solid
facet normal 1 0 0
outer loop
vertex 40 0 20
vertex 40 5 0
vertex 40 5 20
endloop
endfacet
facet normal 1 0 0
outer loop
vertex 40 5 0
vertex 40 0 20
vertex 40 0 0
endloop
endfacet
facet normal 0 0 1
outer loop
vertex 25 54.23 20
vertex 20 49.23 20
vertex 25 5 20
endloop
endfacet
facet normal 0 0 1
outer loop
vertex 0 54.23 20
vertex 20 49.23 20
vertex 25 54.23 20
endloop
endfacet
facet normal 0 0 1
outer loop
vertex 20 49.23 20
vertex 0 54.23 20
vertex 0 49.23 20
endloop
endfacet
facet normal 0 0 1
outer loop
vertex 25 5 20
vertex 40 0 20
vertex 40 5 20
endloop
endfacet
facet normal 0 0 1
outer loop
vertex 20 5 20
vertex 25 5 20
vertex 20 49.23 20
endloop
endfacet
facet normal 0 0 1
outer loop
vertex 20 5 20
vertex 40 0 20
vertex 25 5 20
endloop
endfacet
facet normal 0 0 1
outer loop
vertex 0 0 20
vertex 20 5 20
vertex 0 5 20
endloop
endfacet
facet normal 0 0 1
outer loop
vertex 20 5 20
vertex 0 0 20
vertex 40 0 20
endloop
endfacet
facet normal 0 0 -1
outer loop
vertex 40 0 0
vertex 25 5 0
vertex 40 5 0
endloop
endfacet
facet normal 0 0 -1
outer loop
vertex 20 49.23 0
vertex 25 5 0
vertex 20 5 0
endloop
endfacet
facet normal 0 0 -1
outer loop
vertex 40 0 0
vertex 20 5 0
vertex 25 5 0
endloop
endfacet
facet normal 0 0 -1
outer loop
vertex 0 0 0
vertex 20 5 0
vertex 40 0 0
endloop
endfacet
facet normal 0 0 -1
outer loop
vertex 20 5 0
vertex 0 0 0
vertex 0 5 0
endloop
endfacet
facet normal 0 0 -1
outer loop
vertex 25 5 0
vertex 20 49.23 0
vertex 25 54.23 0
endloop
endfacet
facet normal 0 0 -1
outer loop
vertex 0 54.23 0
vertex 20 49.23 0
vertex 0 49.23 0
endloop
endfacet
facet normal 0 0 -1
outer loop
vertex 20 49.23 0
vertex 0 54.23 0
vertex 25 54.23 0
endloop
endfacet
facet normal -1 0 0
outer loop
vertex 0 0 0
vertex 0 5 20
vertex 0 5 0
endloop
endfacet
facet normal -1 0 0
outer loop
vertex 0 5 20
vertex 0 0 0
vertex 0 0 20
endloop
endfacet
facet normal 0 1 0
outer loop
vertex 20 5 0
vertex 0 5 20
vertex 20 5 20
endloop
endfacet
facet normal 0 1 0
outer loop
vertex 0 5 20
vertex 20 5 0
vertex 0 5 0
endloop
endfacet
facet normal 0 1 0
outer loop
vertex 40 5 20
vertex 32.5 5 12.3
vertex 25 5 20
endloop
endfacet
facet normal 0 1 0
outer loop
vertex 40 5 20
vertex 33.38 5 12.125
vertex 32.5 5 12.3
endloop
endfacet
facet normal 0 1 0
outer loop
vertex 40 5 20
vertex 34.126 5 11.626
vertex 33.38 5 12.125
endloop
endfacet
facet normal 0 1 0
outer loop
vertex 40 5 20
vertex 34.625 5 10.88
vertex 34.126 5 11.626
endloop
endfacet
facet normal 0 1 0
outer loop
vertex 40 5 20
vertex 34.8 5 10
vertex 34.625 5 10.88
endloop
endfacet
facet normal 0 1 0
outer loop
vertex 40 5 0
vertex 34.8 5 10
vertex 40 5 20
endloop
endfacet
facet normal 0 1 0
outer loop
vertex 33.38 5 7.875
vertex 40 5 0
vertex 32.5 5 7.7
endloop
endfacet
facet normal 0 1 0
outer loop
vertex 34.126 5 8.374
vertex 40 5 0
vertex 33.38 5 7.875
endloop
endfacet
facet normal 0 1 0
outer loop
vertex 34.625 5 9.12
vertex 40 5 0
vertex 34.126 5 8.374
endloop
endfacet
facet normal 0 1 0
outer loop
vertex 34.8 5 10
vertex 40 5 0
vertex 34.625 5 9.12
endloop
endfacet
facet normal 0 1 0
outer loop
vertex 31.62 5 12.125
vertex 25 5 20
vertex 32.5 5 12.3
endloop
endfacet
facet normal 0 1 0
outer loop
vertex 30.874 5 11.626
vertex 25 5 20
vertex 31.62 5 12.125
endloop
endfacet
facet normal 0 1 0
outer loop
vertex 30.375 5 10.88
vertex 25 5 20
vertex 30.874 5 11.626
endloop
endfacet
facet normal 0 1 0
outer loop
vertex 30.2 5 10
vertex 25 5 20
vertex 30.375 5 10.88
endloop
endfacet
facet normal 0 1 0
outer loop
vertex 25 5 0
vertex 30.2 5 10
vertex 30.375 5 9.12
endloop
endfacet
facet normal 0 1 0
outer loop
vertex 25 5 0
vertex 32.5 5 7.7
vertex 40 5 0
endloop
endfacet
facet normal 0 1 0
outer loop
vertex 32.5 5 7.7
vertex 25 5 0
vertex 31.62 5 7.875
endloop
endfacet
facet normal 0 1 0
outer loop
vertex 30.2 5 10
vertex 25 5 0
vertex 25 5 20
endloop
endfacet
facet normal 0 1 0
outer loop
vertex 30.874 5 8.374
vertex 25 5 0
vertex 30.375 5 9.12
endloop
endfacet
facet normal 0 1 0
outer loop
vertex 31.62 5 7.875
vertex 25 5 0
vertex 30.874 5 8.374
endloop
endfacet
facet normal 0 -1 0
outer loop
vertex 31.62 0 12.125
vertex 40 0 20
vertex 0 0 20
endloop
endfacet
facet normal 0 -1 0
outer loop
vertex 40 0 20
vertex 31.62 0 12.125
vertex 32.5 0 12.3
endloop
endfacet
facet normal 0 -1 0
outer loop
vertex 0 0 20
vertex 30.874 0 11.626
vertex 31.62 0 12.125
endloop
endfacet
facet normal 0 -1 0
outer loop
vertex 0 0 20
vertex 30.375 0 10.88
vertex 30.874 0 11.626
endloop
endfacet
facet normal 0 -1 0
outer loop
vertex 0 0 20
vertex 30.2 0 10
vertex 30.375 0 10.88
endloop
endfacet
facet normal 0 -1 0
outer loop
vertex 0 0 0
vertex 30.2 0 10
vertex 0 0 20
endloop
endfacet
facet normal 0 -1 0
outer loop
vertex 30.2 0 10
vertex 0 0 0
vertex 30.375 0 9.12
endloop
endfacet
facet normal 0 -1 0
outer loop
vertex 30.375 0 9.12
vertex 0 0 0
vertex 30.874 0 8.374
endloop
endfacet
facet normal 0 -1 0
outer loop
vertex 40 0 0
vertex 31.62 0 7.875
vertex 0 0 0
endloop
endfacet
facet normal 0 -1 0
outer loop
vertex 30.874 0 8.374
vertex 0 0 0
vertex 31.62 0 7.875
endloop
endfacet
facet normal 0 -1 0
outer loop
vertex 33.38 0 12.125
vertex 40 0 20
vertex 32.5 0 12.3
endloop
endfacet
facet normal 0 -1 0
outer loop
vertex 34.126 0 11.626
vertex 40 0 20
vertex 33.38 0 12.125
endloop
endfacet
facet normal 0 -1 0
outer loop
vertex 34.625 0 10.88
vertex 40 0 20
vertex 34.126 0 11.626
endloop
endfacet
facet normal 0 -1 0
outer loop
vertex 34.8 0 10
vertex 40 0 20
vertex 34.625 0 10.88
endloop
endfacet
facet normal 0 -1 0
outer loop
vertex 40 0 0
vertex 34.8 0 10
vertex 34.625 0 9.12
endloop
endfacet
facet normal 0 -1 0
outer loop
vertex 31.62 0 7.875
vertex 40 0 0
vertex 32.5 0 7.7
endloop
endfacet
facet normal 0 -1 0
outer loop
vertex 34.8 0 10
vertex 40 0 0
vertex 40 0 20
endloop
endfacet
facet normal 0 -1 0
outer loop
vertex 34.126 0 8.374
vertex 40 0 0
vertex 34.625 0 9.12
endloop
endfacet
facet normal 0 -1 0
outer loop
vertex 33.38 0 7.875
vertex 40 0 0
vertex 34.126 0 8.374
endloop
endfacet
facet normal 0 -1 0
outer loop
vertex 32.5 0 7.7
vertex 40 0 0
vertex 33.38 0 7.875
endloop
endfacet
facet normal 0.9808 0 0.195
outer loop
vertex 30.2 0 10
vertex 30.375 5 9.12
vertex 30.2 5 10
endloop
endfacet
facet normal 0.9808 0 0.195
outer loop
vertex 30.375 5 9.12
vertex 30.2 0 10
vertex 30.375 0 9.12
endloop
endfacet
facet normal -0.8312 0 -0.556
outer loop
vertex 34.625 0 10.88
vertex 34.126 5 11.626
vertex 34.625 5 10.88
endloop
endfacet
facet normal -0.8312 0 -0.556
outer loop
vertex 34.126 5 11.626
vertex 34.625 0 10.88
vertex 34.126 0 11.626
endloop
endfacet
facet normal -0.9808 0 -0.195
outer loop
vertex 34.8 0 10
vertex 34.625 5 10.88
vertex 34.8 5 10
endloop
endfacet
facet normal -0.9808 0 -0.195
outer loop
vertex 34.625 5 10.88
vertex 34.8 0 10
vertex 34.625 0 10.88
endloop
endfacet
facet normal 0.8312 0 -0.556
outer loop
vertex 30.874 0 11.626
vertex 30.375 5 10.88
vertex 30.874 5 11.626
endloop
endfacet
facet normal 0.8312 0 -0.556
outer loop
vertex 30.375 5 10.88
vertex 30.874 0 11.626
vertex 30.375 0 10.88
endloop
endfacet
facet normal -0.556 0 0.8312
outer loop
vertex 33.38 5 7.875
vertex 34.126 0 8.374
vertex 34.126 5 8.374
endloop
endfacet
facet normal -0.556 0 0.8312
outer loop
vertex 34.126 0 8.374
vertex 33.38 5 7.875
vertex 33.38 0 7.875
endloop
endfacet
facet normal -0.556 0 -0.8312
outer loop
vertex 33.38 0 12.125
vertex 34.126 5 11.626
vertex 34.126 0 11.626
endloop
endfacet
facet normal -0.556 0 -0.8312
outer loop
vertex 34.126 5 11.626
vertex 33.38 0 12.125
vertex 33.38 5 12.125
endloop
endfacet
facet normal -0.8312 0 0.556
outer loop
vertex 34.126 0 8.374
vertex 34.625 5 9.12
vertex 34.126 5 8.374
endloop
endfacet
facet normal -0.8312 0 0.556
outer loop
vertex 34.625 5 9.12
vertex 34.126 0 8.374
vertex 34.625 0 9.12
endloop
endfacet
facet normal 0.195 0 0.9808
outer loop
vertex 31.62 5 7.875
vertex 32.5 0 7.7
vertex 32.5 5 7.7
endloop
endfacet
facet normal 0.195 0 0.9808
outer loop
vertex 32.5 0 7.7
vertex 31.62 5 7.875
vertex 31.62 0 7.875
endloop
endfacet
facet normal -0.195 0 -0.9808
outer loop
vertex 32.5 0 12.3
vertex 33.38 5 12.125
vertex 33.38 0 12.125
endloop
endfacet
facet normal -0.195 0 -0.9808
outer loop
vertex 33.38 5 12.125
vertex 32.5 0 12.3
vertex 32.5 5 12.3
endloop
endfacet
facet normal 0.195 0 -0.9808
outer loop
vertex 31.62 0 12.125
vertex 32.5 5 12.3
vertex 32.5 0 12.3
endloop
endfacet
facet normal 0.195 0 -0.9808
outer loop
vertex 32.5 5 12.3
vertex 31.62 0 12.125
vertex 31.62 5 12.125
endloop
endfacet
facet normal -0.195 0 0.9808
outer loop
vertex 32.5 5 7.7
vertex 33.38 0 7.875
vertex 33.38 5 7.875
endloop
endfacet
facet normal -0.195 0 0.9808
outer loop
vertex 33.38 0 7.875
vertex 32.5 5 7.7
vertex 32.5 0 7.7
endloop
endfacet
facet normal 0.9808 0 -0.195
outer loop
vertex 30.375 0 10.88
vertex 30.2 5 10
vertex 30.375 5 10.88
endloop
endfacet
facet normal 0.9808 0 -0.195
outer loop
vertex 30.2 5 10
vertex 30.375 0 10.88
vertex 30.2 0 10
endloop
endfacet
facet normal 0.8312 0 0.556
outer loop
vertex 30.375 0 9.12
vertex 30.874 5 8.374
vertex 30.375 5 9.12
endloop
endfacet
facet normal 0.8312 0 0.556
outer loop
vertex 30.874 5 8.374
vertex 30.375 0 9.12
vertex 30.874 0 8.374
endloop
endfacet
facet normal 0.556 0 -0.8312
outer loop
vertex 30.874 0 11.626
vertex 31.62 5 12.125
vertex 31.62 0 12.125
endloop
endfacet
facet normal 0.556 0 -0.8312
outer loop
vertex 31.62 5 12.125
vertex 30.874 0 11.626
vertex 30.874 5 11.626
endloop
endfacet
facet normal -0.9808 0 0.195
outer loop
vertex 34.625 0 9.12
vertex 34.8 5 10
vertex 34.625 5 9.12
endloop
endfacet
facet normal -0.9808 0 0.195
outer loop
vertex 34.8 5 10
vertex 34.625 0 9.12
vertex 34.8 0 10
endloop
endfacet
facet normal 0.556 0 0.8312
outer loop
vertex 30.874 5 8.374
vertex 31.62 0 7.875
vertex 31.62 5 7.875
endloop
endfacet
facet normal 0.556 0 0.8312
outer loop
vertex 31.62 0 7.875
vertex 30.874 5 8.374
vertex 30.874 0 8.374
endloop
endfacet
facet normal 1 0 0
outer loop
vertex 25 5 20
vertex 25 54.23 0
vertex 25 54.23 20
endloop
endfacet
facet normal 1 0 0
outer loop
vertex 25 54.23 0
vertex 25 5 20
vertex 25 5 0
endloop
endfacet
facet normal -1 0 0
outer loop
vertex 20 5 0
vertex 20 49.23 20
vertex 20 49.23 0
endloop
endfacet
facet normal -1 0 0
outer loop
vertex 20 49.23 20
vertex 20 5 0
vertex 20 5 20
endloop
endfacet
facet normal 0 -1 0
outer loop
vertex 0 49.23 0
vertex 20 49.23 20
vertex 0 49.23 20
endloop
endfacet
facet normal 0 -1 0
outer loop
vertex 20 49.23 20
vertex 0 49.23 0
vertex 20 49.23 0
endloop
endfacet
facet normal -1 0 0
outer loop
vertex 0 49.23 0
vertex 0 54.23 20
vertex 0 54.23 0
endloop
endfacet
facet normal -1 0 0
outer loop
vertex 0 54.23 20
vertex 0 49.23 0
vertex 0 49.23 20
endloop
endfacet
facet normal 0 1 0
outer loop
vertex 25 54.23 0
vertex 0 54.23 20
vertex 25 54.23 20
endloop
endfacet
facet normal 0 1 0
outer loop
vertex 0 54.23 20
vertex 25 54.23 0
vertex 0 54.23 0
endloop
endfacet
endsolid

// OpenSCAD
//
//  Top bar
//
translate ([20, 0, 0]) {
  cube ([5, 49.23, 20]);
};

//
//  Middle bar
//
translate ([0, 49.23, 0]) {
  cube ([25, 5, 20]);
};
//
//  Bottom bar
//
difference () {
  cube ([40, 5, 20]);
  translate ([32.5, 0, 10]) {
    rotate ([90, 0, 0]) {
      cylinder (h=11, d=4.6, $fn=16, center=true);
    }
  }
};
